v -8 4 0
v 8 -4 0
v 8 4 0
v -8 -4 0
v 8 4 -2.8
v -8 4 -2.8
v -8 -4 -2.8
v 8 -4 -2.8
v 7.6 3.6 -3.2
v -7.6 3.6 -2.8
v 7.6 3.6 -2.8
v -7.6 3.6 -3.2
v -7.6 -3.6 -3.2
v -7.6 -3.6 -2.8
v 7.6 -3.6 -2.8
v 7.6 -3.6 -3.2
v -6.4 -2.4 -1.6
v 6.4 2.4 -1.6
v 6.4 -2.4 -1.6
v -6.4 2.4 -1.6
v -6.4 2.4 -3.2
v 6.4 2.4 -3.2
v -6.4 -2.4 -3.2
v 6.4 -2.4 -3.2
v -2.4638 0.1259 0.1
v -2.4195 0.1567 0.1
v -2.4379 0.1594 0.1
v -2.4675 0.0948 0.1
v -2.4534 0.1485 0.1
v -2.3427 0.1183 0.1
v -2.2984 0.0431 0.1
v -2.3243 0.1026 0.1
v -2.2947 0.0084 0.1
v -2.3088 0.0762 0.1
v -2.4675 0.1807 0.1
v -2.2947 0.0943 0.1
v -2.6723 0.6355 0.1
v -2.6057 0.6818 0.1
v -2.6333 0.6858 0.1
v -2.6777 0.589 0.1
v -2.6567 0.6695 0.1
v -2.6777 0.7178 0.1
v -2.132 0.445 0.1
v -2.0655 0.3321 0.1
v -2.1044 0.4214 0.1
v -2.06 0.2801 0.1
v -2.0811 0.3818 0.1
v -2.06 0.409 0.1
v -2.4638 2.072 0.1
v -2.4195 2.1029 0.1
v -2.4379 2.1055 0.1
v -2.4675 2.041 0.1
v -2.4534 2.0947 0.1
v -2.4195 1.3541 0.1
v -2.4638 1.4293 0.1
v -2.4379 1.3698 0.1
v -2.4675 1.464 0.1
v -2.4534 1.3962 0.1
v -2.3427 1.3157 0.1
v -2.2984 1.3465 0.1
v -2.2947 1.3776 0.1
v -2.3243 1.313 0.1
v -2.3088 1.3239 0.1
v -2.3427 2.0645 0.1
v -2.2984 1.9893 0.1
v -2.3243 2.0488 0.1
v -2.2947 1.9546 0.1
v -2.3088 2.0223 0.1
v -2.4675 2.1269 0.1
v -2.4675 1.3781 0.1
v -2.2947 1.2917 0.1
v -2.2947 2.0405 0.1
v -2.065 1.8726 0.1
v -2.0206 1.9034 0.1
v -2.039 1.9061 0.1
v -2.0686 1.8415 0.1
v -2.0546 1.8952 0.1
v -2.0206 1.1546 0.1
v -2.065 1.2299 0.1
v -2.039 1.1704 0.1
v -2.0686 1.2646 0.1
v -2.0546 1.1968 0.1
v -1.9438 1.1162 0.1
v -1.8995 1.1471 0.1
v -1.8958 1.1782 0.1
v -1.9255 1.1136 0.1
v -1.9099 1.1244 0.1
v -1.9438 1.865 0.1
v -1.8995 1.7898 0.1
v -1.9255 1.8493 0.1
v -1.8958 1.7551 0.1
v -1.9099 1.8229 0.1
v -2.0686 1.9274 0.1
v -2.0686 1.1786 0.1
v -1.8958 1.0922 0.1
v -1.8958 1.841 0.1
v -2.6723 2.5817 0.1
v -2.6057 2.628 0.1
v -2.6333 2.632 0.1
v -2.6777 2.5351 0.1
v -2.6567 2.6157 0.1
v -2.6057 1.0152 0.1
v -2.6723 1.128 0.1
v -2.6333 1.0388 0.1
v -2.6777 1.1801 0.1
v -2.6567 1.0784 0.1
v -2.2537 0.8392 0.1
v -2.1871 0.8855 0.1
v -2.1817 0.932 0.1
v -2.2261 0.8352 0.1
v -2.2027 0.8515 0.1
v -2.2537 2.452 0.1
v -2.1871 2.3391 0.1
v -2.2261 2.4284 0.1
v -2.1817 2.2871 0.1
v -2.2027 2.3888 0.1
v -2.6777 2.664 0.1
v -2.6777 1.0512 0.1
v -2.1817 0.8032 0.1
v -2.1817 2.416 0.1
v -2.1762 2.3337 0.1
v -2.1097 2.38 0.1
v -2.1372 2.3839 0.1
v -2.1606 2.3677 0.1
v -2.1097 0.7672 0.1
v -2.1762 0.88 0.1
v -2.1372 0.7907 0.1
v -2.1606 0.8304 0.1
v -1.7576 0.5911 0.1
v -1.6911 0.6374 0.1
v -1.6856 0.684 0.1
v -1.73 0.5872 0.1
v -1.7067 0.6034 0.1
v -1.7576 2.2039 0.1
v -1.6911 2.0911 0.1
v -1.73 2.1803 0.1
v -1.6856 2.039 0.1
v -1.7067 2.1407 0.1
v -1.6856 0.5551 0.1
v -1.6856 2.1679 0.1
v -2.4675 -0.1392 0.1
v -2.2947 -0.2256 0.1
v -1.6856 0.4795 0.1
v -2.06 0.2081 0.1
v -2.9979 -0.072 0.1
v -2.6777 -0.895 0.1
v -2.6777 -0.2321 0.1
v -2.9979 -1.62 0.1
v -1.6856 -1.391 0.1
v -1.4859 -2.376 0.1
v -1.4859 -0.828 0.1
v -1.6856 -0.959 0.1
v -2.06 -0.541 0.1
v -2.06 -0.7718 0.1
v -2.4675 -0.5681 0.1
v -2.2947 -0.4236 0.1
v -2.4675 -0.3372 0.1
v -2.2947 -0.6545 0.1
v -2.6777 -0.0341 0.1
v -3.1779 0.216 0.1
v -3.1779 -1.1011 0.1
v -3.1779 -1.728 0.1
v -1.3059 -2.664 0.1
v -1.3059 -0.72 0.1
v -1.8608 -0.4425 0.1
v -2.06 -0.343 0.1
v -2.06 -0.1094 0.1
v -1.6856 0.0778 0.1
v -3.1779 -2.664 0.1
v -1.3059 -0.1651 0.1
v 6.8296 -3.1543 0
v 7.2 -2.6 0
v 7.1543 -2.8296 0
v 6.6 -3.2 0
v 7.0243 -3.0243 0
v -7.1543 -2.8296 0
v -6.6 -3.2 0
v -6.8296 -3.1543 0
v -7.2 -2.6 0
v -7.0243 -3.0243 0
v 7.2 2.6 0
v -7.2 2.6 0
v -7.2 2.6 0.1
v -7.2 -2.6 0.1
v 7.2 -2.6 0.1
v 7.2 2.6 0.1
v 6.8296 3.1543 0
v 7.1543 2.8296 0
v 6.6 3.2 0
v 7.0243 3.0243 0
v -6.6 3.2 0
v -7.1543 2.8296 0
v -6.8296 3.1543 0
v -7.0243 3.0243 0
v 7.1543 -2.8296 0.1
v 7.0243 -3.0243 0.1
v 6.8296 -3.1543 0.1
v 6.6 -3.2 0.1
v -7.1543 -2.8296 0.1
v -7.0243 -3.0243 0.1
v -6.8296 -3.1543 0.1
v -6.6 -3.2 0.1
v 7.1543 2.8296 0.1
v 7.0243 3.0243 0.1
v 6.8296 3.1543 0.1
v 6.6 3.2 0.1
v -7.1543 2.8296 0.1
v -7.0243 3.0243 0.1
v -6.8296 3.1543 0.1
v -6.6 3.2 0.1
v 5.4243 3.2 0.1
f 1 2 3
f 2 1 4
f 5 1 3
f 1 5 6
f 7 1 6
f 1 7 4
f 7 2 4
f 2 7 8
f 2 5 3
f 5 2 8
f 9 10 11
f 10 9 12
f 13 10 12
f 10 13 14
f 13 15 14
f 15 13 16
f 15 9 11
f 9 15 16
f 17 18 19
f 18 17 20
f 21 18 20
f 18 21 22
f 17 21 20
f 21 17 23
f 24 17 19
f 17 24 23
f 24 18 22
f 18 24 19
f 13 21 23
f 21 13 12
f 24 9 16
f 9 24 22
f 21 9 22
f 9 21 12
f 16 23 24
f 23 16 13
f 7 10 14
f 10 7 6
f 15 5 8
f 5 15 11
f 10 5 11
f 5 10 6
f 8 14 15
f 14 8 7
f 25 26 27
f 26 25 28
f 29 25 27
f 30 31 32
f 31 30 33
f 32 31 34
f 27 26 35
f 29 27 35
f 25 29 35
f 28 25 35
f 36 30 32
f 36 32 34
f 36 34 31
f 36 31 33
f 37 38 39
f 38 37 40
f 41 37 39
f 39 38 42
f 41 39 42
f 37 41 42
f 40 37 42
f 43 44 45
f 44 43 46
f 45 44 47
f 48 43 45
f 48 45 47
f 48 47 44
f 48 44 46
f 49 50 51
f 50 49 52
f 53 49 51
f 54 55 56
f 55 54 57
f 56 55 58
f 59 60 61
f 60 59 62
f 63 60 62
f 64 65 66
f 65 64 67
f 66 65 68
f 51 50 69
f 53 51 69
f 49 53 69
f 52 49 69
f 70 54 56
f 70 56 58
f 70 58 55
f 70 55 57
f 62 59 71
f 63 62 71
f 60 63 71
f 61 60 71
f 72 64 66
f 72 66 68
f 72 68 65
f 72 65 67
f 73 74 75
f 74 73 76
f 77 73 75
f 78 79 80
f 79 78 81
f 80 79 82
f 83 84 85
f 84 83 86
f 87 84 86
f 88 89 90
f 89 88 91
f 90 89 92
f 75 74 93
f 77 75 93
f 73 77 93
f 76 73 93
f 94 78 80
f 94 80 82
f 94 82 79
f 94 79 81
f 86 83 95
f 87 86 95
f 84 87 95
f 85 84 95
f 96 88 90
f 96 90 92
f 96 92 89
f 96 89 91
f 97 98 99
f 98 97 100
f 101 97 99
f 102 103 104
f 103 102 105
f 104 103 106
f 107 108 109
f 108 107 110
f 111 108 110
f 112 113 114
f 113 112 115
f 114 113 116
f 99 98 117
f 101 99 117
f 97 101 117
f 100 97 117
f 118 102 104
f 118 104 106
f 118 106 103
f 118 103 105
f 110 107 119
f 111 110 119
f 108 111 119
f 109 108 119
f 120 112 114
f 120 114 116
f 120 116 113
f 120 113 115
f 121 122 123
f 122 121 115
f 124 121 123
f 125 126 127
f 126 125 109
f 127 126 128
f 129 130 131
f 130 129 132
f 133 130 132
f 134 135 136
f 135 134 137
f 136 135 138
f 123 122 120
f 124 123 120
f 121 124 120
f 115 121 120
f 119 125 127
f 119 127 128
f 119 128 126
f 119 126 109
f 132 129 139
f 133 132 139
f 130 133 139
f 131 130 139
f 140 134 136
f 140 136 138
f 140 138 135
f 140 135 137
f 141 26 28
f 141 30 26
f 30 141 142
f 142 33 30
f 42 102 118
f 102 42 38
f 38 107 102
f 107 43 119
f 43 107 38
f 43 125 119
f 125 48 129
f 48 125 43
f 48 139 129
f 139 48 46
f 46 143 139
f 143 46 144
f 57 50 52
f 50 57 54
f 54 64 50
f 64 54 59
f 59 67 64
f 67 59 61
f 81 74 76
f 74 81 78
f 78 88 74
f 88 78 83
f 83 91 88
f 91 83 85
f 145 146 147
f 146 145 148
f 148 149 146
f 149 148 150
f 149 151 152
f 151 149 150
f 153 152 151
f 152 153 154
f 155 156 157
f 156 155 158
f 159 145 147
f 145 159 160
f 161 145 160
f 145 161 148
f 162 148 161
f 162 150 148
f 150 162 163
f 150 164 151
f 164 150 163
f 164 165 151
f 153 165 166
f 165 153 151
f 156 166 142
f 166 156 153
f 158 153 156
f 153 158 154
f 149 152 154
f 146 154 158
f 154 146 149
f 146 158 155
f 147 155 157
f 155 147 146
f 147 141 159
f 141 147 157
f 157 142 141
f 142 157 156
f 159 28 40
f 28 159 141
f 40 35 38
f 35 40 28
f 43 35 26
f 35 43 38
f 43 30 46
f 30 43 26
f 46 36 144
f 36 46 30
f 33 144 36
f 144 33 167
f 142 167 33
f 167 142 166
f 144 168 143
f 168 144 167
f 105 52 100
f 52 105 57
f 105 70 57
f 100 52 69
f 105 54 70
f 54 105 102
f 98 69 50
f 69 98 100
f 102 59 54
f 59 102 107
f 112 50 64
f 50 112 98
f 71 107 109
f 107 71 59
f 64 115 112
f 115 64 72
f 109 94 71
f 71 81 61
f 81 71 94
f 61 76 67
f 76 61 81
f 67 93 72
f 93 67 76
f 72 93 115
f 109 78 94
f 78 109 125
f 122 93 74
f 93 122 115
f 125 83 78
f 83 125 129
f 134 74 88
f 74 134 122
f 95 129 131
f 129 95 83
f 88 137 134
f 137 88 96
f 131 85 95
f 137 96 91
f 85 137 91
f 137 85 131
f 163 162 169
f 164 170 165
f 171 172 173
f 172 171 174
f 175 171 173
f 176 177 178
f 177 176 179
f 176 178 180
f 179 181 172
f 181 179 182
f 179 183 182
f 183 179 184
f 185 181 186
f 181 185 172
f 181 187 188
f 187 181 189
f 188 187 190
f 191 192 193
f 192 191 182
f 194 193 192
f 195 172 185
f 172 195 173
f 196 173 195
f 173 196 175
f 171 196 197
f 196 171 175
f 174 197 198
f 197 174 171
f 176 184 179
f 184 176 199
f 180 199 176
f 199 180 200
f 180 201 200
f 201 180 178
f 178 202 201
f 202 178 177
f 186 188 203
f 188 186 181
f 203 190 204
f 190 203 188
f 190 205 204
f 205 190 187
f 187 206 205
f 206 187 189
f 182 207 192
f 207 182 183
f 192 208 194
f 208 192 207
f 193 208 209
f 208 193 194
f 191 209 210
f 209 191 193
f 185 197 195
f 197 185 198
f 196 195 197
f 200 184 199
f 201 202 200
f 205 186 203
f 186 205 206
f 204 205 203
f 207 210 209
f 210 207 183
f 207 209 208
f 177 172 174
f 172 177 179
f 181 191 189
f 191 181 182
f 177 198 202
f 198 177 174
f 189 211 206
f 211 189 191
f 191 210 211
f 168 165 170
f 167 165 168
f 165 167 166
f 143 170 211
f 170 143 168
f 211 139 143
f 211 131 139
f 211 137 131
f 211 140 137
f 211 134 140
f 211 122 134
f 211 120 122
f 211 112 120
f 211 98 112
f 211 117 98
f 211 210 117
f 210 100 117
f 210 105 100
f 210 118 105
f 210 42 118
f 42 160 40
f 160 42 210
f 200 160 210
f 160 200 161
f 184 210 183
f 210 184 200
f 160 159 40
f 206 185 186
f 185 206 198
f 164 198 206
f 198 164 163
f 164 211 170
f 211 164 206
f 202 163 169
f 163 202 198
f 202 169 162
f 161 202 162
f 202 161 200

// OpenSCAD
// file: ../p/1-4ndis.scad
use <../lib.scad>
function ldraw_lib__1_4ndis() = [
// 0 Disc Negative 0.25
// 0 Name: 1-4ndis.dat
// 0 Author: James Jessiman
// 0 !LDRAW_ORG Primitive UPDATE 2012-01
// 0 !LICENSE Licensed under CC BY 4.0 : see CAreadme.txt
// 
// 0 BFC CERTIFY CCW
  [0,"BFC","CERTIFY"],
  [0,"BFC","CCW"],
// 
// 0 !HISTORY 2002-03-23 [sbliss] Added BFC Statement
// 0 !HISTORY 2002-04-25 [PTadmin] Official Update 2002-02
// 0 !HISTORY 2007-06-22 [PTadmin] Header formatted for Contributor Agreement
// 0 !HISTORY 2008-07-01 [PTadmin] Official Update 2008-01
// 0 !HISTORY 2012-02-16 [Philo] Changed to CCW
// 0 !HISTORY 2012-03-30 [PTadmin] Official Update 2012-01
// 
// 
// 3 16 0.9239 0 0.3827 1 0 0 1 0 1
  [3,16,0.9239,0,0.3827,1,0,0,1,0,1],
// 3 16 0.7071 0 0.7071 0.9239 0 0.3827 1 0 1
  [3,16,0.7071,0,0.7071,0.9239,0,0.3827,1,0,1],
// 3 16 0.3827 0 0.9239 0.7071 0 0.7071 1 0 1
  [3,16,0.3827,0,0.9239,0.7071,0,0.7071,1,0,1],
// 3 16 0 0 1 0.3827 0 0.9239 1 0 1
  [3,16,0,0,1,0.3827,0,0.9239,1,0,1],
];
module ldraw_lib__1_4ndis(step=0, col=false, unit=2/5, alt=false, line=0.2, solid=!$preview)
    makepoly(ldraw_lib__1_4ndis(), step=step, col=col, unit=unit, alt=alt, line=line, solid=solid);
ldraw_lib__1_4ndis(line=0.2);
// file: ../p/box5.scad
use <../lib.scad>
function ldraw_lib__box5() = [
// 0 Box with 5 Faces and All Edges
// 0 Name: box5.dat
// 0 Author: James Jessiman
// 0 !LDRAW_ORG Primitive UPDATE 2012-01
// 0 !LICENSE Licensed under CC BY 4.0 : see CAreadme.txt
// 
// 0 BFC CERTIFY CCW
  [0,"BFC","CERTIFY"],
  [0,"BFC","CCW"],
// 
// 0 !HISTORY 2002-04-03 [sbliss] Modified for BFC compliance
// 0 !HISTORY 2002-04-25 [PTadmin] Official Update 2002-02
// 0 !HISTORY 2007-06-24 [PTadmin] Header formatted for Contributor Agreement
// 0 !HISTORY 2008-07-01 [PTadmin] Official Update 2008-01
// 0 !HISTORY 2012-02-16 [Philo] Changed to CCW
// 0 !HISTORY 2012-03-30 [PTadmin] Official Update 2012-01
// 
// 
// 2 24 1 1 1 -1 1 1
  [2,24,1,1,1,-1,1,1],
// 2 24 -1 1 1 -1 1 -1
  [2,24,-1,1,1,-1,1,-1],
// 2 24 -1 1 -1 1 1 -1
  [2,24,-1,1,-1,1,1,-1],
// 2 24 1 1 -1 1 1 1
  [2,24,1,1,-1,1,1,1],
// 2 24 1 0 1 -1 0 1
  [2,24,1,0,1,-1,0,1],
// 2 24 -1 0 1 -1 0 -1
  [2,24,-1,0,1,-1,0,-1],
// 2 24 -1 0 -1 1 0 -1
  [2,24,-1,0,-1,1,0,-1],
// 2 24 1 0 -1 1 0 1
  [2,24,1,0,-1,1,0,1],
// 2 24 1 0 1 1 1 1
  [2,24,1,0,1,1,1,1],
// 2 24 -1 0 1 -1 1 1
  [2,24,-1,0,1,-1,1,1],
// 2 24 1 0 -1 1 1 -1
  [2,24,1,0,-1,1,1,-1],
// 2 24 -1 0 -1 -1 1 -1
  [2,24,-1,0,-1,-1,1,-1],
// 4 16 -1 1 1 1 1 1 1 1 -1 -1 1 -1
  [4,16,-1,1,1,1,1,1,1,1,-1,-1,1,-1],
// 4 16 -1 1 1 -1 0 1 1 0 1 1 1 1
  [4,16,-1,1,1,-1,0,1,1,0,1,1,1,1],
// 4 16 -1 1 -1 -1 0 -1 -1 0 1 -1 1 1
  [4,16,-1,1,-1,-1,0,-1,-1,0,1,-1,1,1],
// 4 16 1 1 -1 1 0 -1 -1 0 -1 -1 1 -1
  [4,16,1,1,-1,1,0,-1,-1,0,-1,-1,1,-1],
// 4 16 1 1 1 1 0 1 1 0 -1 1 1 -1
  [4,16,1,1,1,1,0,1,1,0,-1,1,1,-1],
];
module ldraw_lib__box5(step=0, col=false, unit=2/5, alt=false, line=0.2, solid=!$preview)
    makepoly(ldraw_lib__box5(), step=step, col=col, unit=unit, alt=alt, line=line, solid=solid);
ldraw_lib__box5(line=0.2);
// file: ../p/box4.scad
use <../lib.scad>
function ldraw_lib__box4() = [
// 0 Box with 4 Faces (2 Parallel Pairs) and All Edges
// 0 Name: box4.dat
// 0 Author: James Jessiman
// 0 !LDRAW_ORG Primitive UPDATE 2012-01
// 0 !LICENSE Licensed under CC BY 4.0 : see CAreadme.txt
// 
// 0 BFC CERTIFY CCW
  [0,"BFC","CERTIFY"],
  [0,"BFC","CCW"],
// 
// 0 !HISTORY 2002-04-03 [sbliss] Modified for BFC compliance
// 0 !HISTORY 2002-04-25 [PTadmin] Official Update 2002-02
// 0 !HISTORY 2007-06-24 [PTadmin] Header formatted for Contributor Agreement
// 0 !HISTORY 2008-07-01 [PTadmin] Official Update 2008-01
// 0 !HISTORY 2012-02-16 [Philo] Changed to CCW
// 0 !HISTORY 2012-03-30 [PTadmin] Official Update 2012-01
// 
// 
// 2 24 1 1 1 -1 1 1
  [2,24,1,1,1,-1,1,1],
// 2 24 -1 1 1 -1 1 -1
  [2,24,-1,1,1,-1,1,-1],
// 2 24 -1 1 -1 1 1 -1
  [2,24,-1,1,-1,1,1,-1],
// 2 24 1 1 -1 1 1 1
  [2,24,1,1,-1,1,1,1],
// 2 24 1 0 1 -1 0 1
  [2,24,1,0,1,-1,0,1],
// 2 24 -1 0 1 -1 0 -1
  [2,24,-1,0,1,-1,0,-1],
// 2 24 -1 0 -1 1 0 -1
  [2,24,-1,0,-1,1,0,-1],
// 2 24 1 0 -1 1 0 1
  [2,24,1,0,-1,1,0,1],
// 2 24 1 0 1 1 1 1
  [2,24,1,0,1,1,1,1],
// 2 24 -1 0 1 -1 1 1
  [2,24,-1,0,1,-1,1,1],
// 2 24 1 0 -1 1 1 -1
  [2,24,1,0,-1,1,1,-1],
// 2 24 -1 0 -1 -1 1 -1
  [2,24,-1,0,-1,-1,1,-1],
// 4 16 -1 1 1 -1 0 1 1 0 1 1 1 1
  [4,16,-1,1,1,-1,0,1,1,0,1,1,1,1],
// 4 16 -1 1 -1 -1 0 -1 -1 0 1 -1 1 1
  [4,16,-1,1,-1,-1,0,-1,-1,0,1,-1,1,1],
// 4 16 1 1 -1 1 0 -1 -1 0 -1 -1 1 -1
  [4,16,1,1,-1,1,0,-1,-1,0,-1,-1,1,-1],
// 4 16 1 1 1 1 0 1 1 0 -1 1 1 -1
  [4,16,1,1,1,1,0,1,1,0,-1,1,1,-1],
];
module ldraw_lib__box4(step=0, col=false, unit=2/5, alt=false, line=0.2, solid=!$preview)
    makepoly(ldraw_lib__box4(), step=step, col=col, unit=unit, alt=alt, line=line, solid=solid);
ldraw_lib__box4(line=0.2);
// file: ../p/box3u12.scad
use <../lib.scad>
function ldraw_lib__box3u12() = [
// 0 Box with 3 Parallel Faces without Any Edges
// 0 Name: box3u12.dat
// 0 Author: J.C. Tchang [tchang]
// 0 !LDRAW_ORG Primitive UPDATE 2014-02
// 0 !LICENSE Licensed under CC BY 4.0 : see CAreadme.txt
// 
// 0 BFC CERTIFY CCW
  [0,"BFC","CERTIFY"],
  [0,"BFC","CCW"],
// 
// 0 !HISTORY 2014-12-23 [PTadmin] Official Update 2014-02
// 
// 
// 4 16 -1 1 1 1 1 1 1 1 -1 -1 1 -1
  [4,16,-1,1,1,1,1,1,1,1,-1,-1,1,-1],
// 4 16 -1 1 1 -1 0 1 1 0 1 1 1 1
  [4,16,-1,1,1,-1,0,1,1,0,1,1,1,1],
// 4 16 1 1 -1 1 0 -1 -1 0 -1 -1 1 -1
  [4,16,1,1,-1,1,0,-1,-1,0,-1,-1,1,-1],
];
module ldraw_lib__box3u12(step=0, col=false, unit=2/5, alt=false, line=0.2, solid=!$preview)
    makepoly(ldraw_lib__box3u12(), step=step, col=col, unit=unit, alt=alt, line=line, solid=solid);
ldraw_lib__box3u12(line=0.2);
// file: ../p/1-8chrd.scad
use <../lib.scad>
function ldraw_lib__1_8chrd() = [
// 0 Chord 0.125
// 0 Name: 1-8chrd.dat
// 0 Author: Orion Pobursky [OrionP]
// 0 !LDRAW_ORG Primitive UPDATE 2023-05
// 0 !LICENSE Licensed under CC BY 4.0 : see CAreadme.txt
// 
// 0 BFC CERTIFY CCW
  [0,"BFC","CERTIFY"],
  [0,"BFC","CCW"],
// 
// 0 !HISTORY 2004-04-22 [PTadmin] Official Update 2004-02
// 0 !HISTORY 2007-06-22 [PTadmin] Header formatted for Contributor Agreement
// 0 !HISTORY 2008-07-01 [PTadmin] Official Update 2008-01
// 0 !HISTORY 2023-10-27 [OrionP] Rebuilt with PrimGen2, original author westrate
// 0 !HISTORY 2023-10-31 [OrionP] Official Update 2023-05
// 
// 3 16 1 0 0 0.9239 0 0.3827 0.7071 0 0.7071
  [3,16,1,0,0,0.9239,0,0.3827,0.7071,0,0.7071],
];
module ldraw_lib__1_8chrd(step=0, col=false, unit=2/5, alt=false, line=0.2, solid=!$preview)
    makepoly(ldraw_lib__1_8chrd(), step=step, col=col, unit=unit, alt=alt, line=line, solid=solid);
ldraw_lib__1_8chrd(line=0.2);
// file: ../p/1-4cyli.scad
use <../lib.scad>
function ldraw_lib__1_4cyli() = [
// 0 Cylinder 0.25
// 0 Name: 1-4cyli.dat
// 0 Author: James Jessiman
// 0 !LDRAW_ORG Primitive UPDATE 2012-01
// 0 !LICENSE Licensed under CC BY 4.0 : see CAreadme.txt
// 
// 0 BFC CERTIFY CCW
  [0,"BFC","CERTIFY"],
  [0,"BFC","CCW"],
// 
// 0 !HISTORY 2002-03-23 [sbliss] Added BFC statement.
// 0 !HISTORY 2002-04-25 [PTadmin] Official Update 2002-02
// 0 !HISTORY 2007-06-22 [PTadmin] Header formatted for Contributor Agreement
// 0 !HISTORY 2008-07-01 [PTadmin] Official Update 2008-01
// 0 !HISTORY 2012-02-16 [Philo] Changed to CCW
// 0 !HISTORY 2012-03-30 [PTadmin] Official Update 2012-01
// 
// 
// 4 16 1 1 0 0.9239 1 0.3827 0.9239 0 0.3827 1 0 0
  [4,16,1,1,0,0.9239,1,0.3827,0.9239,0,0.3827,1,0,0],
// 5 24 1 0 0 1 1 0 0.9239 0 0.3827 1 0 -1
  [5,24,1,0,0,1,1,0,0.9239,0,0.3827,1,0,-1],
// 4 16 0.9239 1 0.3827 0.7071 1 0.7071 0.7071 0 0.7071 0.9239 0 0.3827
  [4,16,0.9239,1,0.3827,0.7071,1,0.7071,0.7071,0,0.7071,0.9239,0,0.3827],
// 5 24 0.9239 0 0.3827 0.9239 1 0.3827 0.7071 0 0.7071 1 0 0
  [5,24,0.9239,0,0.3827,0.9239,1,0.3827,0.7071,0,0.7071,1,0,0],
// 4 16 0.7071 1 0.7071 0.3827 1 0.9239 0.3827 0 0.9239 0.7071 0 0.7071
  [4,16,0.7071,1,0.7071,0.3827,1,0.9239,0.3827,0,0.9239,0.7071,0,0.7071],
// 5 24 0.7071 0 0.7071 0.7071 1 0.7071 0.3827 0 0.9239 0.9239 0 0.3827
  [5,24,0.7071,0,0.7071,0.7071,1,0.7071,0.3827,0,0.9239,0.9239,0,0.3827],
// 4 16 0.3827 1 0.9239 0 1 1 0 0 1 0.3827 0 0.9239
  [4,16,0.3827,1,0.9239,0,1,1,0,0,1,0.3827,0,0.9239],
// 5 24 0.3827 0 0.9239 0.3827 1 0.9239 0 0 1 0.7071 0 0.7071
  [5,24,0.3827,0,0.9239,0.3827,1,0.9239,0,0,1,0.7071,0,0.7071],
// 5 24 0 0 1 0 1 1 0.3827 0 0.9239 -1 0 1
  [5,24,0,0,1,0,1,1,0.3827,0,0.9239,-1,0,1],
];
module ldraw_lib__1_4cyli(step=0, col=false, unit=2/5, alt=false, line=0.2, solid=!$preview)
    makepoly(ldraw_lib__1_4cyli(), step=step, col=col, unit=unit, alt=alt, line=line, solid=solid);
ldraw_lib__1_4cyli(line=0.2);
// file: ../p/1-4chrd.scad
use <../lib.scad>
function ldraw_lib__1_4chrd() = [
// 0 Chord 0.25
// 0 Name: 1-4chrd.dat
// 0 Author: Max Martin Richter [MMR1988]
// 0 !LDRAW_ORG Primitive UPDATE 2023-05
// 0 !LICENSE Licensed under CC BY 4.0 : see CAreadme.txt
// 
// 0 BFC CERTIFY CCW
  [0,"BFC","CERTIFY"],
  [0,"BFC","CCW"],
// 
// 0 !HISTORY 2004-04-22 [PTadmin] Official Update 2004-02
// 0 !HISTORY 2007-10-09 [PTadmin] Header formatted for Contributor Agreement
// 0 !HISTORY 2008-07-01 [PTadmin] Official Update 2008-01
// 0 !HISTORY 2012-08-02 [MMR1988] Re-creation with PrimGen2 and Rectifier
// 0 !HISTORY 2012-08-09 [PTadmin] Official Update 2012-02
// 0 !HISTORY 2023-10-27 [OrionP] Change author to MMR1988 from hafhead
// 0 !HISTORY 2023-10-31 [OrionP] Official Update 2023-05
// 
// 4 16 0.9239 0 0.3827 0.3827 0 0.9239 0 0 1 1 0 0
  [4,16,0.9239,0,0.3827,0.3827,0,0.9239,0,0,1,1,0,0],
// 3 16 0.7071 0 0.7071 0.3827 0 0.9239 0.9239 0 0.3827
  [3,16,0.7071,0,0.7071,0.3827,0,0.9239,0.9239,0,0.3827],
];
module ldraw_lib__1_4chrd(step=0, col=false, unit=2/5, alt=false, line=0.2, solid=!$preview)
    makepoly(ldraw_lib__1_4chrd(), step=step, col=col, unit=unit, alt=alt, line=line, solid=solid);
ldraw_lib__1_4chrd(line=0.2);
// file: s/3069bs01.scad
use <../../lib.scad>
use <../../p/box4.scad>
use <../../p/box5.scad>
function ldraw_lib__s__3069bs01() = [
// 0 ~Tile  1 x  2 with Groove without Top Face
// 0 Name: s\3069bs01.dat
// 0 Author: Santeri Piippo [arezey]
// 0 !LDRAW_ORG Subpart UPDATE 2010-02
// 0 !LICENSE Licensed under CC BY 4.0 : see CAreadme.txt
// 
// 0 BFC CERTIFY CCW
  [0,"BFC","CERTIFY"],
  [0,"BFC","CCW"],
// 
// 0 !HISTORY 2010-07-05 [PTadmin] Official Update 2010-02
// 
// 
// 1 16 0 0 0 20 0 0 0 7 0 0 0 10 box4.dat
  [1,16,0,0,0,20,0,0,0,7,0,0,0,10, ldraw_lib__box4()],
// 1 16 0 7 0 19 0 0 0 1 0 0 0 9 box4.dat
  [1,16,0,7,0,19,0,0,0,1,0,0,0,9, ldraw_lib__box4()],
// 0 BFC INVERTNEXT
  [0,"BFC","INVERTNEXT"],
// 1 16 0 8 0 16 0 0 0 -4 0 0 0 6 box5.dat
  [1,16,0,8,0,16,0,0,0,-4,0,0,0,6, ldraw_lib__box5()],
// 4 16 -19 8 9 -16 8 6 -16 8 -6 -19 8 -9
  [4,16,-19,8,9,-16,8,6,-16,8,-6,-19,8,-9],
// 4 16 19 8 -9 16 8 -6 16 8 6 19 8 9
  [4,16,19,8,-9,16,8,-6,16,8,6,19,8,9],
// 4 16 19 8 9 16 8 6 -16 8 6 -19 8 9
  [4,16,19,8,9,16,8,6,-16,8,6,-19,8,9],
// 4 16 -19 8 -9 -16 8 -6 16 8 -6 19 8 -9
  [4,16,-19,8,-9,-16,8,-6,16,8,-6,19,8,-9],
// 4 16 -20 7 10 -19 7 9 -19 7 -9 -20 7 -10
  [4,16,-20,7,10,-19,7,9,-19,7,-9,-20,7,-10],
// 4 16 20 7 -10 19 7 -9 19 7 9 20 7 10
  [4,16,20,7,-10,19,7,-9,19,7,9,20,7,10],
// 4 16 20 7 10 19 7 9 -19 7 9 -20 7 10
  [4,16,20,7,10,19,7,9,-19,7,9,-20,7,10],
// 4 16 -20 7 -10 -19 7 -9 19 7 -9 20 7 -10
  [4,16,-20,7,-10,-19,7,-9,19,7,-9,20,7,-10],
// 0 //
];
module ldraw_lib__s__3069bs01(step=0, col=false, unit=2/5, alt=false, line=0.2, solid=!$preview)
    makepoly(ldraw_lib__s__3069bs01(), step=step, col=col, unit=unit, alt=alt, line=line, solid=solid);
ldraw_lib__s__3069bs01(line=0.2);
// file: 6142271k.scad
use <../lib.scad>
use <../p/1-4chrd.scad>
use <../p/1-4cyli.scad>
use <../p/1-8chrd.scad>
use <../p/box3u12.scad>
use <s/6142271hs01.scad>
function ldraw_lib__6142271k() = [
// 0 Sticker  1.8 x  .8 with R8 Logo on Black and White Background Right
// 0 Name: 6142271k.dat
// 0 Author: Massimo Maso [Sirio]
// 0 !LDRAW_ORG Part UPDATE 2025-05
// 0 !LICENSE Licensed under CC BY 4.0 : see CAreadme.txt
// 
// 0 BFC CERTIFY CCW
  [0,"BFC","CERTIFY"],
  [0,"BFC","CCW"],
// 
// 0 !KEYWORDS Audi, Bricklink 75873stk01a, Brickowl 427960, LMS, Rebrickable 24755
// 0 !KEYWORDS Set 75873, Speed Champions, Ultra
// 
// 0 !HISTORY 2025-05-28 [OrionP] Official Update 2025-05
// 
// 
// 0 // Subparts
// 1 15 0 -.25 5.60475 1 0 0 0 1 0 0 0 1 s\6142271hs01.dat
  [1,15,0,-.25,5.60475,1,0,0,0,1,0,0,0,1, ldraw_lib__s__6142271hs01()],
// 0 // Primitives
// 1 16 -6.5 0 -16.5 0 0 -1.5 0 -1 0 -1.5 0 0 1-4chrd.dat
  [1,16,-6.5,0,-16.5,0,0,-1.5,0,-1,0,-1.5,0,0, ldraw_lib__1_4chrd()],
// 1 16 -6.5 0 16.5 0 0 -1.5 0 -1 0 1.5 0 0 1-4chrd.dat
  [1,16,-6.5,0,16.5,0,0,-1.5,0,-1,0,1.5,0,0, ldraw_lib__1_4chrd()],
// 1 16 0 -.25 0 -6.5 0 0 0 .25 0 0 0 18 box3u12.dat
  [1,16,0,-.25,0,-6.5,0,0,0,.25,0,0,0,18, ldraw_lib__box3u12()],
// 1 16 6.5 0 -16.5 0 0 1.5 0 -1 0 -1.5 0 0 1-4chrd.dat
  [1,16,6.5,0,-16.5,0,0,1.5,0,-1,0,-1.5,0,0, ldraw_lib__1_4chrd()],
// 1 16 6.5 0 16.5 0 0 1.5 0 -1 0 1.5 0 0 1-4chrd.dat
  [1,16,6.5,0,16.5,0,0,1.5,0,-1,0,1.5,0,0, ldraw_lib__1_4chrd()],
// 1 16 -6.5 0 -16.5 0 0 -1.5 0 -.25 0 -1.5 0 0 1-4cyli.dat
  [1,16,-6.5,0,-16.5,0,0,-1.5,0,-.25,0,-1.5,0,0, ldraw_lib__1_4cyli()],
// 1 16 -6.5 0 16.5 0 0 -1.5 0 -.25 0 1.5 0 0 1-4cyli.dat
  [1,16,-6.5,0,16.5,0,0,-1.5,0,-.25,0,1.5,0,0, ldraw_lib__1_4cyli()],
// 1 16 6.5 0 -16.5 0 0 1.5 0 -.25 0 -1.5 0 0 1-4cyli.dat
  [1,16,6.5,0,-16.5,0,0,1.5,0,-.25,0,-1.5,0,0, ldraw_lib__1_4cyli()],
// 1 16 6.5 0 16.5 0 0 1.5 0 -.25 0 1.5 0 0 1-4cyli.dat
  [1,16,6.5,0,16.5,0,0,1.5,0,-.25,0,1.5,0,0, ldraw_lib__1_4cyli()],
// 1 15 -6.5 -.25 -16.5 -1.5 0 0 0 1 0 0 0 -1.5 1-4chrd.dat
  [1,15,-6.5,-.25,-16.5,-1.5,0,0,0,1,0,0,0,-1.5, ldraw_lib__1_4chrd()],
// 1 0 -6.5 -.25 16.5 0 0 -1.5 0 1 0 1.5 0 0 1-8chrd.dat
  [1,0,-6.5,-.25,16.5,0,0,-1.5,0,1,0,1.5,0,0, ldraw_lib__1_8chrd()],
// 1 15 -6.5 -.25 16.5 -1.5 0 0 0 1 0 0 0 1.5 1-8chrd.dat
  [1,15,-6.5,-.25,16.5,-1.5,0,0,0,1,0,0,0,1.5, ldraw_lib__1_8chrd()],
// 1 15 6.5 -.25 -16.5 0 0 1.5 0 1 0 -1.5 0 0 1-4chrd.dat
  [1,15,6.5,-.25,-16.5,0,0,1.5,0,1,0,-1.5,0,0, ldraw_lib__1_4chrd()],
// 1 0 6.5 -.25 16.5 0 0 1.5 0 1 0 1.5 0 0 1-4chrd.dat
  [1,0,6.5,-.25,16.5,0,0,1.5,0,1,0,1.5,0,0, ldraw_lib__1_4chrd()],
// 0 // Bottom faces
// 4 16 -8 0 16.5 -6.5 0 18 -6.5 0 -18 -8 0 -16.5
  [4,16,-8,0,16.5,-6.5,0,18,-6.5,0,-18,-8,0,-16.5],
// 4 16 8 0 16.5 8 0 -16.5 6.5 0 -18 6.5 0 18
  [4,16,8,0,16.5,8,0,-16.5,6.5,0,-18,6.5,0,18],
// 0 // Lateral faces
// 4 16 -8 0 -16.5 -8 -.25 -16.5 -8 -.25 16.5 -8 0 16.5
  [4,16,-8,0,-16.5,-8,-.25,-16.5,-8,-.25,16.5,-8,0,16.5],
// 4 16 8 0 -16.5 8 0 16.5 8 -.25 -13.56075 8 -.25 -16.5
  [4,16,8,0,-16.5,8,0,16.5,8,-.25,-13.56075,8,-.25,-16.5],
// 3 16 8 0 16.5 8 -.25 16.5 8 -.25 -13.56075
  [3,16,8,0,16.5,8,-.25,16.5,8,-.25,-13.56075],
// 0 // Black top faces
// 3 0 .1944 -.25 4.21395 -1.10635 -.25 4.65205 -.4127 -.25 3.26475
  [3,0,.1944,-.25,4.21395,-1.10635,-.25,4.65205,-.4127,-.25,3.26475],
// 4 0 .1944 -.25 4.21395 -.2736 -.25 5.14995 -.8574 -.25 5.14995 -1.10635 -.25 4.65205
  [4,0,.1944,-.25,4.21395,-.2736,-.25,5.14995,-.8574,-.25,5.14995,-1.10635,-.25,4.65205],
// 4 0 8 -.25 -13.56075 1.1988 -.25 4.21395 .1944 -.25 4.21395 -.4127 -.25 3.26475
  [4,0,8,-.25,-13.56075,1.1988,-.25,4.21395,.1944,-.25,4.21395,-.4127,-.25,3.26475],
// 3 0 8 -.25 -13.56075 1.3878 -.25 4.21395 1.1988 -.25 4.21395
  [3,0,8,-.25,-13.56075,1.3878,-.25,4.21395,1.1988,-.25,4.21395],
// 3 0 8 -.25 -13.56075 1.71 -.25 4.21395 1.3878 -.25 4.21395
  [3,0,8,-.25,-13.56075,1.71,-.25,4.21395,1.3878,-.25,4.21395],
// 3 0 8 -.25 -13.56075 5.0976 -.25 4.21395 1.71 -.25 4.21395
  [3,0,8,-.25,-13.56075,5.0976,-.25,4.21395,1.71,-.25,4.21395],
// 3 0 8 -.25 -13.56075 5.4198 -.25 4.21395 5.0976 -.25 4.21395
  [3,0,8,-.25,-13.56075,5.4198,-.25,4.21395,5.0976,-.25,4.21395],
// 3 0 8 -.25 -13.56075 5.5098 -.25 4.39395 5.4198 -.25 4.21395
  [3,0,8,-.25,-13.56075,5.5098,-.25,4.39395,5.4198,-.25,4.21395],
// 3 0 8 -.25 -13.56075 5.9499 -.25 5.27415 5.5098 -.25 4.39395
  [3,0,8,-.25,-13.56075,5.9499,-.25,5.27415,5.5098,-.25,4.39395],
// 3 0 8 -.25 -13.56075 6.0399 -.25 5.45415 5.9499 -.25 5.27415
  [3,0,8,-.25,-13.56075,6.0399,-.25,5.45415,5.9499,-.25,5.27415],
// 3 0 8 -.25 -13.56075 6.1299 -.25 5.63415 6.0399 -.25 5.45415
  [3,0,8,-.25,-13.56075,6.1299,-.25,5.63415,6.0399,-.25,5.45415],
// 3 0 8 -.25 -13.56075 6.57 -.25 6.51435 6.1299 -.25 5.63415
  [3,0,8,-.25,-13.56075,6.57,-.25,6.51435,6.1299,-.25,5.63415],
// 3 0 8 -.25 -13.56075 6.66 -.25 6.69435 6.57 -.25 6.51435
  [3,0,8,-.25,-13.56075,6.66,-.25,6.69435,6.57,-.25,6.51435],
// 3 0 8 -.25 -13.56075 8 -.25 16.5 6.66 -.25 6.69435
  [3,0,8,-.25,-13.56075,8,-.25,16.5,6.66,-.25,6.69435],
// 3 0 8 -.25 16.5 6.3378 -.25 6.69435 6.66 -.25 6.69435
  [3,0,8,-.25,16.5,6.3378,-.25,6.69435,6.66,-.25,6.69435],
// 3 0 8 -.25 16.5 2.9502 -.25 6.69435 6.3378 -.25 6.69435
  [3,0,8,-.25,16.5,2.9502,-.25,6.69435,6.3378,-.25,6.69435],
// 3 0 8 -.25 16.5 2.628 -.25 6.69435 2.9502 -.25 6.69435
  [3,0,8,-.25,16.5,2.628,-.25,6.69435,2.9502,-.25,6.69435],
// 3 0 8 -.25 16.5 1.7946 -.25 6.69435 2.628 -.25 6.69435
  [3,0,8,-.25,16.5,1.7946,-.25,6.69435,2.628,-.25,6.69435],
// 4 0 8 -.25 16.5 .54 -.25 7.94475 1.4724 -.25 6.69435 1.7946 -.25 6.69435
  [4,0,8,-.25,16.5,.54,-.25,7.94475,1.4724,-.25,6.69435,1.7946,-.25,6.69435],
// 4 0 8 -.25 16.5 -7.56065 -.25 17.56065 -2.7527 -.25 7.94475 .54 -.25 7.94475
  [4,0,8,-.25,16.5,-7.56065,-.25,17.56065,-2.7527,-.25,7.94475,.54,-.25,7.94475],
// 4 0 8 -.25 16.5 6.5 -.25 18 -6.5 -.25 18 -7.56065 -.25 17.56065
  [4,0,8,-.25,16.5,6.5,-.25,18,-6.5,-.25,18,-7.56065,-.25,17.56065],
// 3 0 .54 -.25 7.94475 -.0852 -.25 6.69435 1.4724 -.25 6.69435
  [3,0,.54,-.25,7.94475,-.0852,-.25,6.69435,1.4724,-.25,6.69435],
// 0 // White top faces
// 4 15 8 -.25 -16.5 -8 -.25 -16.5 -6.5 -.25 -18 6.5 -.25 -18
  [4,15,8,-.25,-16.5,-8,-.25,-16.5,-6.5,-.25,-18,6.5,-.25,-18],
// 4 15 -8 -.25 -16.5 8 -.25 -16.5 -1.8 -.25 3.26475 -6.66 -.25 3.26475
  [4,15,-8,-.25,-16.5,8,-.25,-16.5,-1.8,-.25,3.26475,-6.66,-.25,3.26475],
// 4 15 8 -.25 -16.5 8 -.25 -13.56075 -.4127 -.25 3.26475 -1.8 -.25 3.26475
  [4,15,8,-.25,-16.5,8,-.25,-13.56075,-.4127,-.25,3.26475,-1.8,-.25,3.26475],
// 4 15 -8 -.25 16.5 -8 -.25 -16.5 -6.66 -.25 3.26475 -6.66 -.25 7.94475
  [4,15,-8,-.25,16.5,-8,-.25,-16.5,-6.66,-.25,3.26475,-6.66,-.25,7.94475],
// 3 15 -8 -.25 16.5 -6.66 -.25 7.94475 -4.32 -.25 7.94475
  [3,15,-8,-.25,16.5,-6.66,-.25,7.94475,-4.32,-.25,7.94475],
// 4 15 -8 -.25 16.5 -4.32 -.25 7.94475 -2.7527 -.25 7.94475 -7.56065 -.25 17.56065
  [4,15,-8,-.25,16.5,-4.32,-.25,7.94475,-2.7527,-.25,7.94475,-7.56065,-.25,17.56065],
];
module ldraw_lib__6142271k(step=0, col=false, unit=2/5, alt=false, line=0.2, solid=!$preview)
    makepoly(ldraw_lib__6142271k(), step=step, col=col, unit=unit, alt=alt, line=line, solid=solid);
ldraw_lib__6142271k(line=0.2);
// file: 3069b.scad
use <../lib.scad>
use <s/3069bs01.scad>
function ldraw_lib__3069b() = [
// 0 Tile  1 x  2 with Groove
// 0 Name: 3069b.dat
// 0 Author: Santeri Piippo [arezey]
// 0 !LDRAW_ORG Part UPDATE 2010-02
// 0 !LICENSE Licensed under CC BY 4.0 : see CAreadme.txt
// 
// 0 BFC CERTIFY CCW
  [0,"BFC","CERTIFY"],
  [0,"BFC","CCW"],
// 
// 0 !KEYWORDS BrickLink 3069
// 
// 0 !HISTORY 2010-07-05 [PTadmin] Official Update 2010-02
// 
// 
// 4 16 20 0 -10 20 0 10 -20 0 10 -20 0 -10
  [4,16,20,0,-10,20,0,10,-20,0,10,-20,0,-10],
// 1 16 0 0 0 1 0 0 0 1 0 0 0 1 s\3069bs01.dat
  [1,16,0,0,0,1,0,0,0,1,0,0,0,1, ldraw_lib__s__3069bs01()],
// 0 //
];
module ldraw_lib__3069b(step=0, col=false, unit=2/5, alt=false, line=0.2, solid=!$preview)
    makepoly(ldraw_lib__3069b(), step=step, col=col, unit=unit, alt=alt, line=line, solid=solid);
ldraw_lib__3069b(line=0.2);
// main file
use <../lib.scad>
use <3069b.scad>
use <6142271k.scad>
function ldraw_lib__3069bd1g() = [
// 0 Tile  1 x  2 with R8 Logo on Black and White Background Right Sticker
// 0 Name: 3069bd1g.dat
// 0 Author: Vincent Messenet [Cheenzo]
// 0 !LDRAW_ORG Shortcut UPDATE 2025-05
// 0 !LICENSE Licensed under CC BY 4.0 : see CAreadme.txt
// 
// 0 BFC CERTIFY CCW
  [0,"BFC","CERTIFY"],
  [0,"BFC","CCW"],
// 
// 0 !CATEGORY Sticker Shortcut
// 0 !KEYWORDS Audi R8 LMS ultra, Bricklink 3069pb0647R, Set 75873
// 
// 0 !HISTORY 2025-05-28 [OrionP] Official Update 2025-05
// 
// 1 16 0 0 0 1 0 0 0 1 0 0 0 1 3069b.dat
  [1,16,0,0,0,1,0,0,0,1,0,0,0,1, ldraw_lib__3069b()],
// 1 16 0 0 0 0 0 -1 0 1 0 1 0 0 6142271k.dat
  [1,16,0,0,0,0,0,-1,0,1,0,1,0,0, ldraw_lib__6142271k()],
];
module ldraw_lib__3069bd1g(step=0, col=false, unit=2/5, alt=false, line=0.2, solid=!$preview)
    makepoly(ldraw_lib__3069bd1g(), step=step, col=col, unit=unit, alt=alt, line=line, solid=solid);
ldraw_lib__3069bd1g(line=0.2);
